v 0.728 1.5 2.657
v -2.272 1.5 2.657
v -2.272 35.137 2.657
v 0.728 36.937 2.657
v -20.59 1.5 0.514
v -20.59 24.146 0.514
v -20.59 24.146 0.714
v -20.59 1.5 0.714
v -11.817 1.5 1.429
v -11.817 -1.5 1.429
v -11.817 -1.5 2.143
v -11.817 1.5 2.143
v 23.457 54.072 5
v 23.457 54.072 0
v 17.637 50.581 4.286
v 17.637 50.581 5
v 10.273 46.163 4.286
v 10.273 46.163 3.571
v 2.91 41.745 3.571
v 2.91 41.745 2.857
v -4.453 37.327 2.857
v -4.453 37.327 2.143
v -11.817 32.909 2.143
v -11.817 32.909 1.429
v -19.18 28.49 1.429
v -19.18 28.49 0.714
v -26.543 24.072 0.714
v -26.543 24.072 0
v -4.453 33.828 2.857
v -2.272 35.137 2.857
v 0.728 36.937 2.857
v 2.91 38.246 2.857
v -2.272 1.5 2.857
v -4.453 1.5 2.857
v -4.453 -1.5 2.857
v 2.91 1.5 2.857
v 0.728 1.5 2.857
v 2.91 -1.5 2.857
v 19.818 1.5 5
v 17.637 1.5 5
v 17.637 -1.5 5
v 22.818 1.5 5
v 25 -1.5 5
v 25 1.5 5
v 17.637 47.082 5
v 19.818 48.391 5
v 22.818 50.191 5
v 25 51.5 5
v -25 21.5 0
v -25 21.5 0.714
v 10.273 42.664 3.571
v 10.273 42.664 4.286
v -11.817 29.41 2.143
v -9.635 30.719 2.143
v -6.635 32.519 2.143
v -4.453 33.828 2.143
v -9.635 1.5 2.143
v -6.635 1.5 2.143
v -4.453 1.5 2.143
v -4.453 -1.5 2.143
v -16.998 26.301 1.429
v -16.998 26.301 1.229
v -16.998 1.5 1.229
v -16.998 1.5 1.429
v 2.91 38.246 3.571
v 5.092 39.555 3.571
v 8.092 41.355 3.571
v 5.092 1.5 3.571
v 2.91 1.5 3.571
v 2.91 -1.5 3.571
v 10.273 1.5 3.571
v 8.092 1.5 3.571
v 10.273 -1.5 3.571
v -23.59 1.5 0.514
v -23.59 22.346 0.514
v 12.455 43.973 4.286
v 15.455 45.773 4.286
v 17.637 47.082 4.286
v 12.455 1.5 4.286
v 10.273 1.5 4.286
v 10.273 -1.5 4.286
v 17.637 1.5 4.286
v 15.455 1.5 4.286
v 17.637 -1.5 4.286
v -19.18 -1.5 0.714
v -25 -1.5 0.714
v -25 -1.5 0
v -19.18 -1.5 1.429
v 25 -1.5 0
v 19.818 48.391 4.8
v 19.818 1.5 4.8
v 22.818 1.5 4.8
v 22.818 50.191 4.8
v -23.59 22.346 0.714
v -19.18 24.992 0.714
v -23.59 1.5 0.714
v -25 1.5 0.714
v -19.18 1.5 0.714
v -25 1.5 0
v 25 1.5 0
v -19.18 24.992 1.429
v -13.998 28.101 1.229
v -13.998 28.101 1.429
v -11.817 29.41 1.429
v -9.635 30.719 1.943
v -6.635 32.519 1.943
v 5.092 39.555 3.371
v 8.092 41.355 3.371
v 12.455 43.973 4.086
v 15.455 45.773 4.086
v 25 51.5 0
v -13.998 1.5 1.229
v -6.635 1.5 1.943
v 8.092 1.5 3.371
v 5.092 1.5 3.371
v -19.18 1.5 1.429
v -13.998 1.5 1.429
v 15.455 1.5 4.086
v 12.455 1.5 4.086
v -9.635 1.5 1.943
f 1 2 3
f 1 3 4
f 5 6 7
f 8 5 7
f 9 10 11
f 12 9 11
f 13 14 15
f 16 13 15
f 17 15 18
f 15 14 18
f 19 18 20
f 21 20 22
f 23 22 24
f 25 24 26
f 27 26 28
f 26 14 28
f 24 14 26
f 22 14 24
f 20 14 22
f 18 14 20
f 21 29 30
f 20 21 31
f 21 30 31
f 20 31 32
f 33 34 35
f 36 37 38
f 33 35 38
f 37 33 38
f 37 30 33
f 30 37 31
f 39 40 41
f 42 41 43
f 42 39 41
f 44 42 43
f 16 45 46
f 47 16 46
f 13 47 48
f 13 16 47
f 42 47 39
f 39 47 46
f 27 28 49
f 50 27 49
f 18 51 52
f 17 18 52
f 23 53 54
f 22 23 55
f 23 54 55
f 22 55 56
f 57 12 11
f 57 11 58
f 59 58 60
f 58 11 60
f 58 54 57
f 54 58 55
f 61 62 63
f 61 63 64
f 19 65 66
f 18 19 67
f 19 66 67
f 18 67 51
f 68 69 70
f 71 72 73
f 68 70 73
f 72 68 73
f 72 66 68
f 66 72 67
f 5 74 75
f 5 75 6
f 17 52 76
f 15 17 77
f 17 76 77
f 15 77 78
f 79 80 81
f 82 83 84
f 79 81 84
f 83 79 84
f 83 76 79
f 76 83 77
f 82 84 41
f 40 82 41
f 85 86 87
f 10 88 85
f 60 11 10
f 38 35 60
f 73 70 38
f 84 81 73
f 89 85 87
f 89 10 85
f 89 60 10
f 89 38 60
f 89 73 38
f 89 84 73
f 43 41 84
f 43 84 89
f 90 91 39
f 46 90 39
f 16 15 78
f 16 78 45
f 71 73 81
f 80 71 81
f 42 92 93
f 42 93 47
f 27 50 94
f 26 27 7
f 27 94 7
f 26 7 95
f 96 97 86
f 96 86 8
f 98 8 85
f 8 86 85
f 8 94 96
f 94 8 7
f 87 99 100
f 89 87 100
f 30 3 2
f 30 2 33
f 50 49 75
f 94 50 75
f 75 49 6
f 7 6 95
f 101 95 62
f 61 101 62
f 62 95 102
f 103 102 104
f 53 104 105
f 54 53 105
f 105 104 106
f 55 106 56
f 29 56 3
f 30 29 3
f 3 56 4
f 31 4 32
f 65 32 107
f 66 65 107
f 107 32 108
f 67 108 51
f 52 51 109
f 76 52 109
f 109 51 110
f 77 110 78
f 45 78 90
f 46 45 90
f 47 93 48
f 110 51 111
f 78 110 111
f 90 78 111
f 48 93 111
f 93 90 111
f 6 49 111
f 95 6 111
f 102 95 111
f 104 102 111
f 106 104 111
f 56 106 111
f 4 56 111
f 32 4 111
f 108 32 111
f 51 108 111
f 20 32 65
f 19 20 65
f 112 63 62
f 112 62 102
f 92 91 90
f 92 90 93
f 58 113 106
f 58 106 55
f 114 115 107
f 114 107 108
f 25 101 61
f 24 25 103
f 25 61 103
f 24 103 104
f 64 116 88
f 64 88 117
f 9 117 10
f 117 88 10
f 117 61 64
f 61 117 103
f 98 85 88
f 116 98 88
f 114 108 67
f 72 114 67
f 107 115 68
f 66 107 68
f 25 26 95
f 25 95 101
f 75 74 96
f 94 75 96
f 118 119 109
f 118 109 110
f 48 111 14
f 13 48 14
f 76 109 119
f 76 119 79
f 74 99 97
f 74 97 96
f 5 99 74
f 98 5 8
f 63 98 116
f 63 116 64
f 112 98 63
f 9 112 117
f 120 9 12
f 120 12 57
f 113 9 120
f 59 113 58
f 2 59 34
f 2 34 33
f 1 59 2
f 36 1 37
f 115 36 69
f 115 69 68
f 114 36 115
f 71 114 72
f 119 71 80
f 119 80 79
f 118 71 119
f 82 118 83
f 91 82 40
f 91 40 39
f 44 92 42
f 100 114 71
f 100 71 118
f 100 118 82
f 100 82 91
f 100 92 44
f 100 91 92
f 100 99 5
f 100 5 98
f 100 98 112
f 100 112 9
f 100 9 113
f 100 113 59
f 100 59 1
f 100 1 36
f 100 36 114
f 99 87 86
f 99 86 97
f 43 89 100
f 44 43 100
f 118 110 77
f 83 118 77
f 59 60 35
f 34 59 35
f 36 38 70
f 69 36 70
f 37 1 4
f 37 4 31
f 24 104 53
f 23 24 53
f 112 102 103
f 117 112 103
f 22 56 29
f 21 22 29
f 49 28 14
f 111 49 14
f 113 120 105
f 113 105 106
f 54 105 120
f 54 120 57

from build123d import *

# Parameters (mm, degrees)
F0_W     = 50
F0_H     = 3
F1_DEPTH = 5
F3_DEPTH = 55.5734787771
F4_W     = 3
F4_H     = 0.2
F5_REACH = 58.5801380528


with BuildPart() as f1:
    # F0 (on Top) → F1 (new body)
    with BuildSketch(Plane.XY):
        Rectangle(F0_W, F0_H)
    extrude(amount=F1_DEPTH)


with BuildPart() as f1b:
    # F0 (on Top) → F1, piece 2 (new body)
    with BuildSketch(Plane.XY):
        Polygon((-26.5434872663, 24.0724787771), (-25, 21.5), (25, 51.5), (23.4565127337, 54.0724787771), align=None)
    extrude(amount=F1_DEPTH)


with BuildPart() as f3_tool:
    # F2 (on face) → F3 (new body, through all)
    with BuildSketch(Plane.XZ.offset(1.5)):
        Polygon((17.6366446762, 5), (-26.5434872663, 5), (-26.5434872663, 0.7142857143), (-19.1801319425, 0.7142857143), (-19.1801319425, 1.4285714286), (-11.8167766188, 1.4285714286), (-11.8167766188, 2.1428571429), (-4.453421295, 2.1428571429), (-4.453421295, 2.8571428571), (2.9099340287, 2.8571428571), (2.9099340287, 3.5714285714), (10.2732893525, 3.5714285714), (10.2732893525, 4.2857142857), (17.6366446762, 4.2857142857), align=None)
    extrude(amount=-F3_DEPTH)


with BuildPart() as f1_1:
    add(f1.part)

    # F3: cut by f3_tool
    add(f3_tool.part, mode=Mode.SUBTRACT)



with BuildPart() as f1b_1:
    add(f1b.part)

    # F3: cut by f3_tool
    add(f3_tool.part, mode=Mode.SUBTRACT)


with BuildPart() as f1_2:
    add(f1_1.part)

    add(f1b_1.part)  # F5 merges F1b
    f5_end = f1_2.faces().sort_by_distance((5.616262324, 43.3683285313, 1.7462125476))[0]
    # F4 (on face) → F5 (join, up to a face of the model that its end follows)
    with BuildSketch(Plane.XZ.offset(1.5)):
        with Locations((-22.0900659713, 0.6142857143)):
            Rectangle(F4_W, F4_H)
        with Locations((-15.4984542807, 1.3285714286)):
            Rectangle(F4_W, F4_H)
        with Locations((-8.1350989569, 2.0428571429)):
            Rectangle(F4_W, F4_H)
        with Locations((-0.7717436331, 2.7571428571)):
            Rectangle(F4_W, F4_H)
        with Locations((6.5916116906, 3.4714285714)):
            Rectangle(F4_W, F4_H)
        with Locations((13.9549670144, 4.1857142857)):
            Rectangle(F4_W, F4_H)
        with Locations((21.3183223381, 4.9)):
            Rectangle(F4_W, F4_H)
    f5_long = extrude(amount=-F5_REACH, mode=Mode.PRIVATE)
    add(split(f5_long, bisect_by=f5_end, keep=Keep.BOTTOM, mode=Mode.PRIVATE))


solid = f1_2.part
